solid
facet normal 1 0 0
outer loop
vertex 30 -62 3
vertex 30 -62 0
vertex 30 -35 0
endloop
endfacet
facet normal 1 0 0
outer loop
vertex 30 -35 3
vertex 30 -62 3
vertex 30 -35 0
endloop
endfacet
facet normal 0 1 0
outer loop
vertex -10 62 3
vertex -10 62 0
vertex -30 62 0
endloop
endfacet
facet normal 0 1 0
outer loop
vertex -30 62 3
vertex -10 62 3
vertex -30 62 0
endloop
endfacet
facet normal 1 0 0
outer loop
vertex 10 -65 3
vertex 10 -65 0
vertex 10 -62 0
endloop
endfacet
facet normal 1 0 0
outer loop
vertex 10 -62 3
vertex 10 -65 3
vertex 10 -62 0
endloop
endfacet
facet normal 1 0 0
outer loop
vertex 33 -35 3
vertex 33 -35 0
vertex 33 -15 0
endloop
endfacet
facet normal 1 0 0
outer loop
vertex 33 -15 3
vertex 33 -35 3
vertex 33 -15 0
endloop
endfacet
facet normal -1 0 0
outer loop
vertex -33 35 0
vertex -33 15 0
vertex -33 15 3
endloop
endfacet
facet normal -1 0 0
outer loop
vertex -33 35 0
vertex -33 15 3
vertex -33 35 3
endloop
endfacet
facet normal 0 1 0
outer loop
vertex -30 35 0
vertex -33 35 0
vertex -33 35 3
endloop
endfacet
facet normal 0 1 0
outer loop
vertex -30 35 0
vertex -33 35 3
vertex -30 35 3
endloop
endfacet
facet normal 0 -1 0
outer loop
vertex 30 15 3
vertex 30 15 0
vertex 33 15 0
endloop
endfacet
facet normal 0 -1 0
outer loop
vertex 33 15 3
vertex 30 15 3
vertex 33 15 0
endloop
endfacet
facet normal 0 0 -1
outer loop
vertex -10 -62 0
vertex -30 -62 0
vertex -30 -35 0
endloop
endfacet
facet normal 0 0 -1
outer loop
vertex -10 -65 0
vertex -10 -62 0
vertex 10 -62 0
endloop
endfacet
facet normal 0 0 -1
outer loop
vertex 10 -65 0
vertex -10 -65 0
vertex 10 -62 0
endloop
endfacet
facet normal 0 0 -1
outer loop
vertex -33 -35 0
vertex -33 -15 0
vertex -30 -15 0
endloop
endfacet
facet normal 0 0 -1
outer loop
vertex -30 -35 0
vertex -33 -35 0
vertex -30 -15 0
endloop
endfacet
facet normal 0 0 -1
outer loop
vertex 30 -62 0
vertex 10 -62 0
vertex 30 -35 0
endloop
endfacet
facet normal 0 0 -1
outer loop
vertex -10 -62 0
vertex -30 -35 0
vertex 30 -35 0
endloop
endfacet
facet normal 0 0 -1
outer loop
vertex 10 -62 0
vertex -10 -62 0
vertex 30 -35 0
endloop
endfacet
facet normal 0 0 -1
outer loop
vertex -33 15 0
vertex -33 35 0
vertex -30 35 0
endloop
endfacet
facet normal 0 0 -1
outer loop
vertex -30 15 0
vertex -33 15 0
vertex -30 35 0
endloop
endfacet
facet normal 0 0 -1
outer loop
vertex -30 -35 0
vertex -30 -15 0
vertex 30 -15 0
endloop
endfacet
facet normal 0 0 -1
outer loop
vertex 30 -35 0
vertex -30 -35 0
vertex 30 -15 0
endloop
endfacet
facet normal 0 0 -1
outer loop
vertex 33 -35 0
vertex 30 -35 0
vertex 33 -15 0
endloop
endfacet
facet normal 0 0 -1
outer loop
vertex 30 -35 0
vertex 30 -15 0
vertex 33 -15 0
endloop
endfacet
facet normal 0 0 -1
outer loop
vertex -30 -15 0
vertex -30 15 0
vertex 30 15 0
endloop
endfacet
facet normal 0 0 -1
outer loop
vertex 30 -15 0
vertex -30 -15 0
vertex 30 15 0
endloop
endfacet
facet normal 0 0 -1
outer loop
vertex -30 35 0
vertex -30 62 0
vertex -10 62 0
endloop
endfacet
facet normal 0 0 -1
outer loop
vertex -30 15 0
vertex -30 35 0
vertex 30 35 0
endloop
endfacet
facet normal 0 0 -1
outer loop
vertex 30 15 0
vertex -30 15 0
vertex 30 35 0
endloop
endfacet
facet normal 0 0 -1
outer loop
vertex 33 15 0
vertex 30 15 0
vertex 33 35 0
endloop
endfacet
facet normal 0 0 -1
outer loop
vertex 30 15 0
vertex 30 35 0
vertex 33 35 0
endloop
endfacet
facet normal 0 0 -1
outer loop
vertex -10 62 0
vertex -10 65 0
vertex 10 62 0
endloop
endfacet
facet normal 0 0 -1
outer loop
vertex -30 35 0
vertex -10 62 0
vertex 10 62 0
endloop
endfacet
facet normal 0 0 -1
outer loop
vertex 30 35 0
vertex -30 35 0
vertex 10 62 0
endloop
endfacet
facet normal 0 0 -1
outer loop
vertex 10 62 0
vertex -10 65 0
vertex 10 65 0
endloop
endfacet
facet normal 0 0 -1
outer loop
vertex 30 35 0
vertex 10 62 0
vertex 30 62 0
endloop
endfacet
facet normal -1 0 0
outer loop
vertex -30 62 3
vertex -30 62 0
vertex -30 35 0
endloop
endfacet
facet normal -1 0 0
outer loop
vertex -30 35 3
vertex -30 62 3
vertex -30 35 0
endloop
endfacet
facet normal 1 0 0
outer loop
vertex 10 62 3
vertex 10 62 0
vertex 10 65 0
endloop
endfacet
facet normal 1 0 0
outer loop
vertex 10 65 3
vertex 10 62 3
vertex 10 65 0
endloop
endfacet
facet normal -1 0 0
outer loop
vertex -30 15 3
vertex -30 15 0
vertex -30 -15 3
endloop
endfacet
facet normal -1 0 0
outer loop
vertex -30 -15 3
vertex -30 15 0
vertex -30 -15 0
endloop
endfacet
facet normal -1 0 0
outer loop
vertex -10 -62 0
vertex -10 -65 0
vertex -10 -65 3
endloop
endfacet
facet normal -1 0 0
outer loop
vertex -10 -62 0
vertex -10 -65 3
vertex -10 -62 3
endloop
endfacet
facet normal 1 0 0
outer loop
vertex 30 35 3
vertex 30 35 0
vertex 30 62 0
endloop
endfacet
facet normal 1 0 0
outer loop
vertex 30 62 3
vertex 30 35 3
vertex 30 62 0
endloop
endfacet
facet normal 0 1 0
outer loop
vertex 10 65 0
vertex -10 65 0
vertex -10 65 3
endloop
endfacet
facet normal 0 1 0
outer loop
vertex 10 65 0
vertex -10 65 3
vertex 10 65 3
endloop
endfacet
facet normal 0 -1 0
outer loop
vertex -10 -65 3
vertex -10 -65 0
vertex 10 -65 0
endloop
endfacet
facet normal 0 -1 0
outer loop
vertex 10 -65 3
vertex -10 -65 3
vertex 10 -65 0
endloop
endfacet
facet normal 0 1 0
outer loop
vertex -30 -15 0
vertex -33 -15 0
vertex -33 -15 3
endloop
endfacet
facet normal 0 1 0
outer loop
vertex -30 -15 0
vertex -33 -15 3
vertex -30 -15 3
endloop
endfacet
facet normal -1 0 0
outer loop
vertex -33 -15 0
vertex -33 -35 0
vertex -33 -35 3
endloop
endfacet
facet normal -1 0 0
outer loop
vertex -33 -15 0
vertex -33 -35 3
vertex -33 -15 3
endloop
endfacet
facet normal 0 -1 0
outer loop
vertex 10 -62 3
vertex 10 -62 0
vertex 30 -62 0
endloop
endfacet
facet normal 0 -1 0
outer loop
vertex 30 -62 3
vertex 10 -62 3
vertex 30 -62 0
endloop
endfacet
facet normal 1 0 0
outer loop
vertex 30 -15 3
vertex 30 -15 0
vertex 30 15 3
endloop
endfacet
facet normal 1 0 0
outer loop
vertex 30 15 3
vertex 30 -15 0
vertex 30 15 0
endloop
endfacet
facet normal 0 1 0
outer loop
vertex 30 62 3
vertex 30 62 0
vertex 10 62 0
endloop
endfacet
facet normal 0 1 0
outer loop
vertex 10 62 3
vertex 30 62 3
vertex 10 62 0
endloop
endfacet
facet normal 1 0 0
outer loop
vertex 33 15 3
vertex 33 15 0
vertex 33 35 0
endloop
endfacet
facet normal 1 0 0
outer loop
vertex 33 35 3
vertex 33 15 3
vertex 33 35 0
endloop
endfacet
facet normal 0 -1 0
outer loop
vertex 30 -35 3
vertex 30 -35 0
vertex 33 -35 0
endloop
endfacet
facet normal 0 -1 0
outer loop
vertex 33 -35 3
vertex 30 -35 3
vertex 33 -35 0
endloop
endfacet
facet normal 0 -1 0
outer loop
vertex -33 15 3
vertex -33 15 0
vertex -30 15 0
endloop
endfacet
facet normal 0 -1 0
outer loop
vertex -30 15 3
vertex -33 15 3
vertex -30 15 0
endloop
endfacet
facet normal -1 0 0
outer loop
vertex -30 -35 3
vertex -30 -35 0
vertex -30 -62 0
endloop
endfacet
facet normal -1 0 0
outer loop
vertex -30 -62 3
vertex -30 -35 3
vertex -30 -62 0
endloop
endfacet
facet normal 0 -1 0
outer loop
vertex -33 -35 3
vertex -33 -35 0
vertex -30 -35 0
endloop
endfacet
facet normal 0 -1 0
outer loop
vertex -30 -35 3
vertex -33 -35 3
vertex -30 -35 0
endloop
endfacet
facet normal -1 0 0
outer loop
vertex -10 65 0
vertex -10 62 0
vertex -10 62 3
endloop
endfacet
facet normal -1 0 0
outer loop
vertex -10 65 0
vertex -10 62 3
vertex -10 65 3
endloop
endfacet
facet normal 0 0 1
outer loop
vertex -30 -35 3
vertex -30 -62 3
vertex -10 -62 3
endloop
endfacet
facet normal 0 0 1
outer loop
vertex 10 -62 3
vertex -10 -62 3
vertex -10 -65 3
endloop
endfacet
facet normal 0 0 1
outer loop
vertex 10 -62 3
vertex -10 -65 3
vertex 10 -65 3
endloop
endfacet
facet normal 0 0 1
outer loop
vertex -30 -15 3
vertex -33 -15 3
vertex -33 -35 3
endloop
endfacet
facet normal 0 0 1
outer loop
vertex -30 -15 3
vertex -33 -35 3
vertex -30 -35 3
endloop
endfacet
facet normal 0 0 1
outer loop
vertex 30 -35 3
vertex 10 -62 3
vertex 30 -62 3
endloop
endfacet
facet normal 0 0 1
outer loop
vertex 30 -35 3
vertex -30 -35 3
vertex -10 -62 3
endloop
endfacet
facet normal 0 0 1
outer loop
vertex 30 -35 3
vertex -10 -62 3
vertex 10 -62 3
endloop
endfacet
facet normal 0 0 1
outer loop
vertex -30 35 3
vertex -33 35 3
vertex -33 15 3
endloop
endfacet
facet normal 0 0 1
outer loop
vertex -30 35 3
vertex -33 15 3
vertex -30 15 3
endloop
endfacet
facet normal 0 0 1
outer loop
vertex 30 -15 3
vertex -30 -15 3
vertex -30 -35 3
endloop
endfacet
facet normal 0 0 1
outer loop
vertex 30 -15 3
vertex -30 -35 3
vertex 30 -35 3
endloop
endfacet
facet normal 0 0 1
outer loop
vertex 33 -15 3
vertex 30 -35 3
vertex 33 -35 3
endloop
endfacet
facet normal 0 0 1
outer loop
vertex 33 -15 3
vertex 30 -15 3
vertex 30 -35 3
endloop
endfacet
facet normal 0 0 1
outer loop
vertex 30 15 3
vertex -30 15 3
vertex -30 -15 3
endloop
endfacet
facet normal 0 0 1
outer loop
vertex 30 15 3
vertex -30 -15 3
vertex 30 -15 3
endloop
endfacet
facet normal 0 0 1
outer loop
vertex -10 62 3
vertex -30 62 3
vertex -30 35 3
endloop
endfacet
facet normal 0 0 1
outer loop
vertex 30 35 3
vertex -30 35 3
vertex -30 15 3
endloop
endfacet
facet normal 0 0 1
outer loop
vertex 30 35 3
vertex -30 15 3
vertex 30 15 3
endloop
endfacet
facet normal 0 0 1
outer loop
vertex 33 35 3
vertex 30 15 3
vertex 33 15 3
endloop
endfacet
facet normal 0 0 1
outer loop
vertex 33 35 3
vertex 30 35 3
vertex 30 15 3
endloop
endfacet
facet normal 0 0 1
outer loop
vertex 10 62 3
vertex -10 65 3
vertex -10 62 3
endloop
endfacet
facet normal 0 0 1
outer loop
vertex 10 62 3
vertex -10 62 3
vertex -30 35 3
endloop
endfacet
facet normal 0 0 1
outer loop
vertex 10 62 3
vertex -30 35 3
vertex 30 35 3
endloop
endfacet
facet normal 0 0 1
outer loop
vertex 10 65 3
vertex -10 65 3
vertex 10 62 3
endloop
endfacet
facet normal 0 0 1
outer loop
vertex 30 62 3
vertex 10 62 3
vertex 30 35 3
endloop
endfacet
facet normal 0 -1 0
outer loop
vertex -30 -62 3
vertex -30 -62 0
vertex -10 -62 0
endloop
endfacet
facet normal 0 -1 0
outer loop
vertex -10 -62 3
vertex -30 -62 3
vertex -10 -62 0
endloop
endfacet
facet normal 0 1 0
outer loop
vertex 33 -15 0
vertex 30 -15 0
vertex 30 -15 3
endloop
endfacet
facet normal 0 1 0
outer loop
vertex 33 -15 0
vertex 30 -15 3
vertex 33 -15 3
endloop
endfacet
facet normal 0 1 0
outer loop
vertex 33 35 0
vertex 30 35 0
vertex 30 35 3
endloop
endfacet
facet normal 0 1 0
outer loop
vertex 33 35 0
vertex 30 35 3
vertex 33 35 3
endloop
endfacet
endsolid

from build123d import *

# Parameters (mm, degrees)
ESQUISSE1_W        = 20
ESQUISSE1_H        = 3
ESQUISSE1_W_2      = 3
ESQUISSE1_H_2      = 20
BOSS_EXTRU_1_DEPTH = 3


with BuildPart() as part:
    # Esquisse1 → Boss.-Extru.1 (new body)
    with BuildSketch(Plane.XY):
        Polygon((10, -62), (30, -62), (30, -35), (27, -35), (27, -15), (30, -15), (30, 15), (27, 15), (27, 35), (30, 35), (30, 62), (10, 62), (10, 59), (-10, 59), (-10, 62), (-30, 62), (-30, 35), (-27, 35), (-27, 15), (-30, 15), (-30, -15), (-27, -15), (-27, -35), (-30, -35), (-30, -62), (-10, -62), (-10, -59), (10, -59), align=None)
        with Locations((0, 60.5)):
            Rectangle(ESQUISSE1_W, ESQUISSE1_H)
        with Locations((0, 63.5)):
            Rectangle(ESQUISSE1_W, ESQUISSE1_H)
        with Locations((-28.5, 25)):
            Rectangle(ESQUISSE1_W_2, ESQUISSE1_H_2)
        with Locations((-31.5, 25)):
            Rectangle(ESQUISSE1_W_2, ESQUISSE1_H_2)
        with Locations((31.5, 25)):
            Rectangle(ESQUISSE1_W_2, ESQUISSE1_H_2)
        with Locations((28.5, 25)):
            Rectangle(ESQUISSE1_W_2, ESQUISSE1_H_2)
        with Locations((31.5, -25)):
            Rectangle(ESQUISSE1_W_2, ESQUISSE1_H_2)
        with Locations((28.5, -25)):
            Rectangle(ESQUISSE1_W_2, ESQUISSE1_H_2)
        with Locations((0, -60.5)):
            Rectangle(ESQUISSE1_W, ESQUISSE1_H)
        with Locations((0, -63.5)):
            Rectangle(ESQUISSE1_W, ESQUISSE1_H)
        with Locations((-28.5, -25)):
            Rectangle(ESQUISSE1_W_2, ESQUISSE1_H_2)
        with Locations((-31.5, -25)):
            Rectangle(ESQUISSE1_W_2, ESQUISSE1_H_2)
    extrude(amount=BOSS_EXTRU_1_DEPTH)


solid = part.part
